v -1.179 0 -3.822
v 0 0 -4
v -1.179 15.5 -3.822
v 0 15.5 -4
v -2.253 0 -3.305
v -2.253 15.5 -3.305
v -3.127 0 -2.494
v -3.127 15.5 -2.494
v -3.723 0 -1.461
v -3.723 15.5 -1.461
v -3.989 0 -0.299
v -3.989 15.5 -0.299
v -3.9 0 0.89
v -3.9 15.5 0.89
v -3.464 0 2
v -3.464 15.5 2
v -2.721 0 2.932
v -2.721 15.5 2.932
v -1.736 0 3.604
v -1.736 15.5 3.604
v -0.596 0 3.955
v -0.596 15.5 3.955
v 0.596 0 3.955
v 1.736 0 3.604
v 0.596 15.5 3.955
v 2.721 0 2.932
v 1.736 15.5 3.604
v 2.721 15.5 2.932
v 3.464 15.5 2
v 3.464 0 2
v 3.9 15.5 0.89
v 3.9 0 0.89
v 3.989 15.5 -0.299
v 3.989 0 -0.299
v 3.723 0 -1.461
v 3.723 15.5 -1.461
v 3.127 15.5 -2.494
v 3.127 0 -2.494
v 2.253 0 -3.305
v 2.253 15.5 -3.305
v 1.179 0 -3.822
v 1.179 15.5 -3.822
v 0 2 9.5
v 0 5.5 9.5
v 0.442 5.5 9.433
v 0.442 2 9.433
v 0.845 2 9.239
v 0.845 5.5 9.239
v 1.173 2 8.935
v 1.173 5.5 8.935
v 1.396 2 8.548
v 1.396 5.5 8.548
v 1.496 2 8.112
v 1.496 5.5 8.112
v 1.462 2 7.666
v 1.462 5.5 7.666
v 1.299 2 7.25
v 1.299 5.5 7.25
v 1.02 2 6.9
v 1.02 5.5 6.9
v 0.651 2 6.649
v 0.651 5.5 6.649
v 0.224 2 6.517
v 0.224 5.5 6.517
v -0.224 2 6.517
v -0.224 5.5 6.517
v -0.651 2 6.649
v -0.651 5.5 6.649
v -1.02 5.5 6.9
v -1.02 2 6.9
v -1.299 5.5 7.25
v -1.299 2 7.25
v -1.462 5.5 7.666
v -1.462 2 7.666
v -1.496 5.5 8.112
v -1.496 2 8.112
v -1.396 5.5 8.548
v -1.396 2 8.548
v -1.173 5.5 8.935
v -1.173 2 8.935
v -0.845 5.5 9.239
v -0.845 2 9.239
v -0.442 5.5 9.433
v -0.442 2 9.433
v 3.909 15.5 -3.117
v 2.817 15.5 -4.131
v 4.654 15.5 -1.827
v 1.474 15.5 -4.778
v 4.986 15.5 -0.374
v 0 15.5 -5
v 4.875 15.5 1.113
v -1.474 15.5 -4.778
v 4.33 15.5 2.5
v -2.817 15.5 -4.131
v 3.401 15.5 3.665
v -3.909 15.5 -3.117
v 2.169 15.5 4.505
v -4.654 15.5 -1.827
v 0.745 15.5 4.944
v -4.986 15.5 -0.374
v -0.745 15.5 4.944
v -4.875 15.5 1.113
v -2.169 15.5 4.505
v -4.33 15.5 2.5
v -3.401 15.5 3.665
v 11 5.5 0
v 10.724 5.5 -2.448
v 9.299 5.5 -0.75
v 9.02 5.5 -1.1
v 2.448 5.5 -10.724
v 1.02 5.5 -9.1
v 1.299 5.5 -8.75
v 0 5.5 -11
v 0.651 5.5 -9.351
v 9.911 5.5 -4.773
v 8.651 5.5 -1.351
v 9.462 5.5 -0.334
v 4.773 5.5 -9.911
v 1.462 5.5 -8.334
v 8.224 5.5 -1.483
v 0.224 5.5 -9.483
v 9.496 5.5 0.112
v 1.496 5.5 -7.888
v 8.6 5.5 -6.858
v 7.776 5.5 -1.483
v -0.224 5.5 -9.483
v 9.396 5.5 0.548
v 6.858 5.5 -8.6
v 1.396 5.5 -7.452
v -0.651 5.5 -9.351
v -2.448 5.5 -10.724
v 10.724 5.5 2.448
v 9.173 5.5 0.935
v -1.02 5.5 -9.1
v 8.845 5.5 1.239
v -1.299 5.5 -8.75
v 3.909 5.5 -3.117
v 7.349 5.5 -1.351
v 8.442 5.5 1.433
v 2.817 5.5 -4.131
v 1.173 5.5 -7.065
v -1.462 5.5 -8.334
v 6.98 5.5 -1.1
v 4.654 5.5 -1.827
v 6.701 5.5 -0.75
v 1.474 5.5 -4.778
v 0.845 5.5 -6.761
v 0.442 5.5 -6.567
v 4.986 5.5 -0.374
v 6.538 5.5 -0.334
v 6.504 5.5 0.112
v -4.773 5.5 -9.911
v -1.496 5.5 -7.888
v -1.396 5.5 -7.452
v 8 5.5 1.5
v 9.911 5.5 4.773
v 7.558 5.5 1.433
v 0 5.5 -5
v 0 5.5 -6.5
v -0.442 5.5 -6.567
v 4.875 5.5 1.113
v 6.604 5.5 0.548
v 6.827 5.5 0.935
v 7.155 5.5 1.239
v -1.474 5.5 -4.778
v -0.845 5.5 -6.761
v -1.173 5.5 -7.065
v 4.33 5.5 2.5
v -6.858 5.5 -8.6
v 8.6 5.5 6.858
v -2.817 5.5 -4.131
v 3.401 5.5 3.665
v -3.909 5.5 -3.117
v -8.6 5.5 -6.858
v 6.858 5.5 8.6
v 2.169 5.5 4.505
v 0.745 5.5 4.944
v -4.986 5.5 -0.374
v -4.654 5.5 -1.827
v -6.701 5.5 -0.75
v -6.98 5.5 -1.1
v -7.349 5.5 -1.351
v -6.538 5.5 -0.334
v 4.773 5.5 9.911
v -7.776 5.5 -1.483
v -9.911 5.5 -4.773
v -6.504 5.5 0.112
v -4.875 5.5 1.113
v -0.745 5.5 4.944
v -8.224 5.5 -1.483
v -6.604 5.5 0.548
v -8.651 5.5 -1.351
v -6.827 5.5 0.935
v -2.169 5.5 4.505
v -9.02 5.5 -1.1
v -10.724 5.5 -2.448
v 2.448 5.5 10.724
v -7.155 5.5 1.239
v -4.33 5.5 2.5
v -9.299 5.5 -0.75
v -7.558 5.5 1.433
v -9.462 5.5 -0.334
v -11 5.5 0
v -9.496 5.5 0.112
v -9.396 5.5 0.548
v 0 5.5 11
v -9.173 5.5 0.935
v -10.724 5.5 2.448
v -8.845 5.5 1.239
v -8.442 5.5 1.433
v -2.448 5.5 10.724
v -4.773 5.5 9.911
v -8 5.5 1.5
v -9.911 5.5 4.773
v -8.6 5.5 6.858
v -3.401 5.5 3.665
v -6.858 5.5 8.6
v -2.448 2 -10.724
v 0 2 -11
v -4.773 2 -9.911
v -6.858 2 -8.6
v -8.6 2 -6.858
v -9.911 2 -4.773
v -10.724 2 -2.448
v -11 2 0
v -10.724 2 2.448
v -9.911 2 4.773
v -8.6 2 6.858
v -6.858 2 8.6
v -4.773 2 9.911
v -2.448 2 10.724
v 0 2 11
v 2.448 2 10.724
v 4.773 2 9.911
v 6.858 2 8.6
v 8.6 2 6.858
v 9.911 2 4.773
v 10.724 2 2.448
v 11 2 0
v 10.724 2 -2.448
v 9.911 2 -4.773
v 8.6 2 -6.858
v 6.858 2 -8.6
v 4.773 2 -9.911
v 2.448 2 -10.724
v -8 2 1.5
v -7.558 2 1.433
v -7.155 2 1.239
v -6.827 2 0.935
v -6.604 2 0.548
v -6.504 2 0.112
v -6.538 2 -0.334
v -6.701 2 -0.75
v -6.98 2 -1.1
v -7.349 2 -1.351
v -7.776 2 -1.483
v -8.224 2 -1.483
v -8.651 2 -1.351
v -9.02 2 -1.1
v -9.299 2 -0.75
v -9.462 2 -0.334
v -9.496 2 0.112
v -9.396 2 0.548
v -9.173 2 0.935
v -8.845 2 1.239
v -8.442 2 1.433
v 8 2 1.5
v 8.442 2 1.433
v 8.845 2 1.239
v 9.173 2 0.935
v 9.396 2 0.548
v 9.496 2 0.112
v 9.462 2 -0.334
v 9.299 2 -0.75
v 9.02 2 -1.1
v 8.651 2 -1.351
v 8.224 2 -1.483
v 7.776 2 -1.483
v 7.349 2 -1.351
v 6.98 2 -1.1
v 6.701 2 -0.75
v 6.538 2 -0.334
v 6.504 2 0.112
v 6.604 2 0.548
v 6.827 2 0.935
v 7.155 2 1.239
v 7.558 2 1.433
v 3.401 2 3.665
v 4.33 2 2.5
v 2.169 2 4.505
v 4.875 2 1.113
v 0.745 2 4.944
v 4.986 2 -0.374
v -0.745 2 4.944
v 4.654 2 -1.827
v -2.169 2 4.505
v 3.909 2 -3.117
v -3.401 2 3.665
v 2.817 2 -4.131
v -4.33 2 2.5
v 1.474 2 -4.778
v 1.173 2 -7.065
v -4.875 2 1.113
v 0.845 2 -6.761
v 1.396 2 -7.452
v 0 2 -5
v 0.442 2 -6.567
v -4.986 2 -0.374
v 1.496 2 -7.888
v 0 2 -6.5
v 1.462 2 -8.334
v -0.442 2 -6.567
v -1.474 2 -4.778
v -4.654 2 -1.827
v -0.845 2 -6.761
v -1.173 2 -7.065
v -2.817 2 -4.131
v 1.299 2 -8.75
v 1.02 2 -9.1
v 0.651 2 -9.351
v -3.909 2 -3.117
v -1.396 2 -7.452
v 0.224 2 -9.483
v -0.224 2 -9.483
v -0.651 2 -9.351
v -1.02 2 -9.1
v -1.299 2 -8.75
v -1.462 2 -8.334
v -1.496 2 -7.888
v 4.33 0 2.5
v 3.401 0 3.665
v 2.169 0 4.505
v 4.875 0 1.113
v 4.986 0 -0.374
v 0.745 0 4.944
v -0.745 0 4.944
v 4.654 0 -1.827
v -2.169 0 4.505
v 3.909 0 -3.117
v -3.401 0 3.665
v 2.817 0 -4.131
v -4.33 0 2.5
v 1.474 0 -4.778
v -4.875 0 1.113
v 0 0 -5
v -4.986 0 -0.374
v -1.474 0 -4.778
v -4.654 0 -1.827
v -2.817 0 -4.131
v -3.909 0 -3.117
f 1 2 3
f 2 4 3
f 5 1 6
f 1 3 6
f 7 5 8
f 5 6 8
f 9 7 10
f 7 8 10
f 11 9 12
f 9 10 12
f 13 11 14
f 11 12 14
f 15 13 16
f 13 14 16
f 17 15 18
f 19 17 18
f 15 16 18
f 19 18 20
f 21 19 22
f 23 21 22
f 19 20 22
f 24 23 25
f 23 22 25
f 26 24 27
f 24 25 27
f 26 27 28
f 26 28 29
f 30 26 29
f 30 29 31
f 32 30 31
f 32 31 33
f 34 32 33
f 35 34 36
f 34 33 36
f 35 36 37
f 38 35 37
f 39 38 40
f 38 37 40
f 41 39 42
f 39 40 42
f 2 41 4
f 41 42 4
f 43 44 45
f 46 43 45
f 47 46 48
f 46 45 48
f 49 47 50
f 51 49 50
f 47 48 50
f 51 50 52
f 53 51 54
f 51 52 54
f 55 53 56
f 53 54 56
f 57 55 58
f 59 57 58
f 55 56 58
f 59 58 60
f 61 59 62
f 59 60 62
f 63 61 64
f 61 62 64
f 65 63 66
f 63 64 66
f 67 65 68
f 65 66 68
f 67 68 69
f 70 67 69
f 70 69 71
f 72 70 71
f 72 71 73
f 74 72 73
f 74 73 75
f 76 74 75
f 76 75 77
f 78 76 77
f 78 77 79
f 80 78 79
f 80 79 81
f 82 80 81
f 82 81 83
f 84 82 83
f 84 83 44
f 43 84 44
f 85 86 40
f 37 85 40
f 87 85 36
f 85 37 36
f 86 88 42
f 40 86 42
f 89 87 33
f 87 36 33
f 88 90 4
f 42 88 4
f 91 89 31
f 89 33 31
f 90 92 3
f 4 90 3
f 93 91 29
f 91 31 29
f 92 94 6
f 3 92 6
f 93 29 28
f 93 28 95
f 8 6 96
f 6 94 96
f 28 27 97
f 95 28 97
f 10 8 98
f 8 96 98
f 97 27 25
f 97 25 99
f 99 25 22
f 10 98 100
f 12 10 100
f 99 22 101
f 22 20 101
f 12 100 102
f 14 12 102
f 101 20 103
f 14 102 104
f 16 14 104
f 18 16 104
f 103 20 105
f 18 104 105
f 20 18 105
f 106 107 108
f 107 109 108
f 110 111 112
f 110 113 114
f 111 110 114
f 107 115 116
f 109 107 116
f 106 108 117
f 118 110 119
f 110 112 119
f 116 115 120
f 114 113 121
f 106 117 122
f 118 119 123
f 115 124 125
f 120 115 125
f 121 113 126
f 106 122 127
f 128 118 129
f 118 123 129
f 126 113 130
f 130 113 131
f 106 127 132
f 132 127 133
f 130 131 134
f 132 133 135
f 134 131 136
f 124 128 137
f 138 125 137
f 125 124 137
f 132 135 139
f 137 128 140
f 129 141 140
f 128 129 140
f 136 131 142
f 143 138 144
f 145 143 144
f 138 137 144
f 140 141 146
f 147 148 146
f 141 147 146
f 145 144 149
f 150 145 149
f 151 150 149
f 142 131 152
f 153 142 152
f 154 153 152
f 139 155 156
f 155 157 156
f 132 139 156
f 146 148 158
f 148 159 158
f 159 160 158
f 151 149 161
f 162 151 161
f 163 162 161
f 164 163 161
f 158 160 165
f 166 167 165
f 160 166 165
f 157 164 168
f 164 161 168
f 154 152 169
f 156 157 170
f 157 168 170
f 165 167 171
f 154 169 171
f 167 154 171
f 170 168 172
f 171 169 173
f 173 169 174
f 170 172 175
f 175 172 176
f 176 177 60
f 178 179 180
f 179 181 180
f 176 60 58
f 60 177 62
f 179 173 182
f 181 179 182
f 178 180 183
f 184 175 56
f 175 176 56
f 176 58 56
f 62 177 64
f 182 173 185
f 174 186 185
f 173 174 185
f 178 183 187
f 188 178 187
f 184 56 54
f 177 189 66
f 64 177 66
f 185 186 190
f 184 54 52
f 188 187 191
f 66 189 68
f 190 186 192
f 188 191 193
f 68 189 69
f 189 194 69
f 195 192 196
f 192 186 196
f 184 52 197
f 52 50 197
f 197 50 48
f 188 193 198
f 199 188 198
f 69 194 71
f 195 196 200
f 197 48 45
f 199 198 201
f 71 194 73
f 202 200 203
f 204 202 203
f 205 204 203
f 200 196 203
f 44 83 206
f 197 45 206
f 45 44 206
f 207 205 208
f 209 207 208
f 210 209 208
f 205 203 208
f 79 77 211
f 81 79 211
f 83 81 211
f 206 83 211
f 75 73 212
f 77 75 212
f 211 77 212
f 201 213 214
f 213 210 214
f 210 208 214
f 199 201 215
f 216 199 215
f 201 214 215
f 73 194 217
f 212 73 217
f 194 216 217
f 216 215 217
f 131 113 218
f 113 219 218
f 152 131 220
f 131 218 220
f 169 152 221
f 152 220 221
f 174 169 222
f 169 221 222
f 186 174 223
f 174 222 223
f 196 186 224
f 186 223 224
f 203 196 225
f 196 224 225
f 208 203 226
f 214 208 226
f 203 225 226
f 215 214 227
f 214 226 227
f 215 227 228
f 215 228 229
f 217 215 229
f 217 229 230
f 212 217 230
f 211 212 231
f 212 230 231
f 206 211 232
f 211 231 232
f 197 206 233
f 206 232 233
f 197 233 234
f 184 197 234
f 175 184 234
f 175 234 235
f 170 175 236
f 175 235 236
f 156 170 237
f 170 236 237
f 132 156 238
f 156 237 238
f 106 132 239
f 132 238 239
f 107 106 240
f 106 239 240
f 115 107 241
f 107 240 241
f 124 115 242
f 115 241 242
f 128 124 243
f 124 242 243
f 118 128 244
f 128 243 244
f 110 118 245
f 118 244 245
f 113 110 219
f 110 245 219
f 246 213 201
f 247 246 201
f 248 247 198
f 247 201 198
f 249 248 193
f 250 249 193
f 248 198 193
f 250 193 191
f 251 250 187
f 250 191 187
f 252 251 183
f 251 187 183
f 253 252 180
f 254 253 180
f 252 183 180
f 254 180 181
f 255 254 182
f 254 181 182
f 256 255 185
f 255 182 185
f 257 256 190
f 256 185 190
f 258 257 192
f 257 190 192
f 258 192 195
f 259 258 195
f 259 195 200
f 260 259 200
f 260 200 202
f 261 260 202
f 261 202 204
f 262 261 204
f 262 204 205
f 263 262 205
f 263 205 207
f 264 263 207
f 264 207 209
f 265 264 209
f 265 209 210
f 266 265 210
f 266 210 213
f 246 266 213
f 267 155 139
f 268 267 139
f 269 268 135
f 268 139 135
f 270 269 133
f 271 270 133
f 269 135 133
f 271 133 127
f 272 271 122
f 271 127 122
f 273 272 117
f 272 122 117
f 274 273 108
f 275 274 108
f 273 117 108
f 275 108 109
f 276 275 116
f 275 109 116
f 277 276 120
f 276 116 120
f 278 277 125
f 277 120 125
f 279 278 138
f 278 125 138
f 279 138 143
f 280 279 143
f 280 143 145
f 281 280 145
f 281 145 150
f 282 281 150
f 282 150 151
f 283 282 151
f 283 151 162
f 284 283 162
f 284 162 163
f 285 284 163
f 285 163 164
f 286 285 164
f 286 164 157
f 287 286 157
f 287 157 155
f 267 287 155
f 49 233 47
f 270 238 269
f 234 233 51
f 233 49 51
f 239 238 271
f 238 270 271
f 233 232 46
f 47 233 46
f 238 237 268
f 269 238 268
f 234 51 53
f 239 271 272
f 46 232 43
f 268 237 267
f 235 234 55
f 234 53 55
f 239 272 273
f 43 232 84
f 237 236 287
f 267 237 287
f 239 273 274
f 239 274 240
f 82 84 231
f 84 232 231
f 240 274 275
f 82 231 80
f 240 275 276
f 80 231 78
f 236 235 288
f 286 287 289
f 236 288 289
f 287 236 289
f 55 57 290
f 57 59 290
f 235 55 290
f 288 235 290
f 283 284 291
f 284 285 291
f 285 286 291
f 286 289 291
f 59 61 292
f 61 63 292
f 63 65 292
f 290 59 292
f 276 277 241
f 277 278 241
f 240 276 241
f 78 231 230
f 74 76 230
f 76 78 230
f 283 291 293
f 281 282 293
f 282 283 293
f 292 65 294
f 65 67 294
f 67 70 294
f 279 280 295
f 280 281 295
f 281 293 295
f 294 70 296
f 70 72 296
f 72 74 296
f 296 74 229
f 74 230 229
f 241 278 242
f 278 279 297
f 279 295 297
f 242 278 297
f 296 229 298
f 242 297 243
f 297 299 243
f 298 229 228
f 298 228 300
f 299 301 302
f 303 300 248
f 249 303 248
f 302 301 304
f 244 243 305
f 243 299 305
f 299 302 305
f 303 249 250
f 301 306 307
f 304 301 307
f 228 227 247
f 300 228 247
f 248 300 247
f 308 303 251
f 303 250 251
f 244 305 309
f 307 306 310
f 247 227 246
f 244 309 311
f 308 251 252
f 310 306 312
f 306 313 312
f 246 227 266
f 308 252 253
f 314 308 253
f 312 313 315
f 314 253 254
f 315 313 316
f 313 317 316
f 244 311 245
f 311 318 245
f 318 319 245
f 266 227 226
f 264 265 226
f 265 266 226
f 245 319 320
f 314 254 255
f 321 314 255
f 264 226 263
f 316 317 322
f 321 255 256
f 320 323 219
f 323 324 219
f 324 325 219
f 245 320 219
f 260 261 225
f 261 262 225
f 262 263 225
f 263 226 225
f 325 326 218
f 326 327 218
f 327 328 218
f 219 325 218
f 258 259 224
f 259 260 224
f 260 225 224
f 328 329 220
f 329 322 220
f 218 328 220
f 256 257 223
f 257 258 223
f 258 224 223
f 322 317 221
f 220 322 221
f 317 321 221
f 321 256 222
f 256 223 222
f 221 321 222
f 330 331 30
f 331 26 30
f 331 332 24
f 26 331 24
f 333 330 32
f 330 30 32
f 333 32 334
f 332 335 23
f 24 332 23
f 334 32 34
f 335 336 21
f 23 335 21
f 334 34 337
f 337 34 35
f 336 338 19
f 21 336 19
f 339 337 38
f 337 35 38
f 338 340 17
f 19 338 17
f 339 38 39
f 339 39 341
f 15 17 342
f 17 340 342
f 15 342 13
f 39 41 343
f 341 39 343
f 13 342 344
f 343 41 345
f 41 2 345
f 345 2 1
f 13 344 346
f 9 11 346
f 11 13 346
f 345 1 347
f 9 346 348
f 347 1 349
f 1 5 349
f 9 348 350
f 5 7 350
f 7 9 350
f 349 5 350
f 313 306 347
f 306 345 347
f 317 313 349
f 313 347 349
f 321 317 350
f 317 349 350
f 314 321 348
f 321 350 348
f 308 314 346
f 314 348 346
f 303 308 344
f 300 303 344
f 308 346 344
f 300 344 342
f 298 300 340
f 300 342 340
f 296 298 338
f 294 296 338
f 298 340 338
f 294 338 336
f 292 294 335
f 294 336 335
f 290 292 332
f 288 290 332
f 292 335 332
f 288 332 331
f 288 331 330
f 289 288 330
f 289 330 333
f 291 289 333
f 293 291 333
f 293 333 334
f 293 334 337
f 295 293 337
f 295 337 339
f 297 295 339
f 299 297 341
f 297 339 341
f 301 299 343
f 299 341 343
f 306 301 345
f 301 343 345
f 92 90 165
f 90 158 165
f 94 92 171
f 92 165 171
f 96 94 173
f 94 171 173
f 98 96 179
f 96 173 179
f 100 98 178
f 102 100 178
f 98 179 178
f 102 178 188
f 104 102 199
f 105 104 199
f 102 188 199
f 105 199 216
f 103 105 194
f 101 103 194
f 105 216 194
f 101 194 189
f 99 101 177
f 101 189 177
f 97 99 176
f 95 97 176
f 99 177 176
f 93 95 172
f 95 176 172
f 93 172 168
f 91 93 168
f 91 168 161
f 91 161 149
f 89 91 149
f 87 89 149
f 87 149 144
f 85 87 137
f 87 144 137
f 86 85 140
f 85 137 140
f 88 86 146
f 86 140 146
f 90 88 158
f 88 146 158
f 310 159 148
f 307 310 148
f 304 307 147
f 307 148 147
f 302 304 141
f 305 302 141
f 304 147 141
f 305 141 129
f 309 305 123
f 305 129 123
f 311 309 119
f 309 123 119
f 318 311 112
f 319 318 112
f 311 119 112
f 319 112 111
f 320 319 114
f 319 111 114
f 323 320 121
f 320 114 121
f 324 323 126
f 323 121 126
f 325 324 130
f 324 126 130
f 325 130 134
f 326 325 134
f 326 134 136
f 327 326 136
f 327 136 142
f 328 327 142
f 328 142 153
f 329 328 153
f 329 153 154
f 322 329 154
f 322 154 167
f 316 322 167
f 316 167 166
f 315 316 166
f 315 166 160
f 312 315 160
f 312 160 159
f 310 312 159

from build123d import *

# Parameters (mm, degrees)
SKETCH_2_R          = 1.5
CUT_EXTRUDE_1_DEPTH = 19.493242009


with BuildPart() as part:
    # 草图1 → 旋转1 (revolve)
    with BuildSketch(Plane.XY, mode=Mode.PRIVATE) as revolve_1_sk:
        Polygon((4, 0), (4, 15.5), (5, 15.5), (5, 5.5), (11, 5.5), (11, 2), (5, 2), (5, 0), align=None)
    revolve(revolve_1_sk.sketch.rotate(Axis((0, -4.166666667, 0), (0, 1, 0)), 90), axis=Axis((0, -4.166666667, 0), (0, 1, 0)))

    # 草图2 → 切除-拉伸1 (cut, through all)
    with BuildSketch(Plane(origin=(0, 5.5, 0), x_dir=(1, 0, 0), z_dir=(0, 1, 0))):
        with Locations(Location((0, 8, 0), (0, 0, 270))):
            Circle(SKETCH_2_R)
        with Locations(Location((8, 0, 0), (0, 0, 270))):
            Circle(SKETCH_2_R)
        with Locations(Location((0, -8, 0), (0, 0, 270))):
            Circle(SKETCH_2_R)
        with Locations(Location((-8, 0, 0), (0, 0, 270))):
            Circle(SKETCH_2_R)
    extrude(amount=-CUT_EXTRUDE_1_DEPTH, mode=Mode.SUBTRACT)


solid = part.part
